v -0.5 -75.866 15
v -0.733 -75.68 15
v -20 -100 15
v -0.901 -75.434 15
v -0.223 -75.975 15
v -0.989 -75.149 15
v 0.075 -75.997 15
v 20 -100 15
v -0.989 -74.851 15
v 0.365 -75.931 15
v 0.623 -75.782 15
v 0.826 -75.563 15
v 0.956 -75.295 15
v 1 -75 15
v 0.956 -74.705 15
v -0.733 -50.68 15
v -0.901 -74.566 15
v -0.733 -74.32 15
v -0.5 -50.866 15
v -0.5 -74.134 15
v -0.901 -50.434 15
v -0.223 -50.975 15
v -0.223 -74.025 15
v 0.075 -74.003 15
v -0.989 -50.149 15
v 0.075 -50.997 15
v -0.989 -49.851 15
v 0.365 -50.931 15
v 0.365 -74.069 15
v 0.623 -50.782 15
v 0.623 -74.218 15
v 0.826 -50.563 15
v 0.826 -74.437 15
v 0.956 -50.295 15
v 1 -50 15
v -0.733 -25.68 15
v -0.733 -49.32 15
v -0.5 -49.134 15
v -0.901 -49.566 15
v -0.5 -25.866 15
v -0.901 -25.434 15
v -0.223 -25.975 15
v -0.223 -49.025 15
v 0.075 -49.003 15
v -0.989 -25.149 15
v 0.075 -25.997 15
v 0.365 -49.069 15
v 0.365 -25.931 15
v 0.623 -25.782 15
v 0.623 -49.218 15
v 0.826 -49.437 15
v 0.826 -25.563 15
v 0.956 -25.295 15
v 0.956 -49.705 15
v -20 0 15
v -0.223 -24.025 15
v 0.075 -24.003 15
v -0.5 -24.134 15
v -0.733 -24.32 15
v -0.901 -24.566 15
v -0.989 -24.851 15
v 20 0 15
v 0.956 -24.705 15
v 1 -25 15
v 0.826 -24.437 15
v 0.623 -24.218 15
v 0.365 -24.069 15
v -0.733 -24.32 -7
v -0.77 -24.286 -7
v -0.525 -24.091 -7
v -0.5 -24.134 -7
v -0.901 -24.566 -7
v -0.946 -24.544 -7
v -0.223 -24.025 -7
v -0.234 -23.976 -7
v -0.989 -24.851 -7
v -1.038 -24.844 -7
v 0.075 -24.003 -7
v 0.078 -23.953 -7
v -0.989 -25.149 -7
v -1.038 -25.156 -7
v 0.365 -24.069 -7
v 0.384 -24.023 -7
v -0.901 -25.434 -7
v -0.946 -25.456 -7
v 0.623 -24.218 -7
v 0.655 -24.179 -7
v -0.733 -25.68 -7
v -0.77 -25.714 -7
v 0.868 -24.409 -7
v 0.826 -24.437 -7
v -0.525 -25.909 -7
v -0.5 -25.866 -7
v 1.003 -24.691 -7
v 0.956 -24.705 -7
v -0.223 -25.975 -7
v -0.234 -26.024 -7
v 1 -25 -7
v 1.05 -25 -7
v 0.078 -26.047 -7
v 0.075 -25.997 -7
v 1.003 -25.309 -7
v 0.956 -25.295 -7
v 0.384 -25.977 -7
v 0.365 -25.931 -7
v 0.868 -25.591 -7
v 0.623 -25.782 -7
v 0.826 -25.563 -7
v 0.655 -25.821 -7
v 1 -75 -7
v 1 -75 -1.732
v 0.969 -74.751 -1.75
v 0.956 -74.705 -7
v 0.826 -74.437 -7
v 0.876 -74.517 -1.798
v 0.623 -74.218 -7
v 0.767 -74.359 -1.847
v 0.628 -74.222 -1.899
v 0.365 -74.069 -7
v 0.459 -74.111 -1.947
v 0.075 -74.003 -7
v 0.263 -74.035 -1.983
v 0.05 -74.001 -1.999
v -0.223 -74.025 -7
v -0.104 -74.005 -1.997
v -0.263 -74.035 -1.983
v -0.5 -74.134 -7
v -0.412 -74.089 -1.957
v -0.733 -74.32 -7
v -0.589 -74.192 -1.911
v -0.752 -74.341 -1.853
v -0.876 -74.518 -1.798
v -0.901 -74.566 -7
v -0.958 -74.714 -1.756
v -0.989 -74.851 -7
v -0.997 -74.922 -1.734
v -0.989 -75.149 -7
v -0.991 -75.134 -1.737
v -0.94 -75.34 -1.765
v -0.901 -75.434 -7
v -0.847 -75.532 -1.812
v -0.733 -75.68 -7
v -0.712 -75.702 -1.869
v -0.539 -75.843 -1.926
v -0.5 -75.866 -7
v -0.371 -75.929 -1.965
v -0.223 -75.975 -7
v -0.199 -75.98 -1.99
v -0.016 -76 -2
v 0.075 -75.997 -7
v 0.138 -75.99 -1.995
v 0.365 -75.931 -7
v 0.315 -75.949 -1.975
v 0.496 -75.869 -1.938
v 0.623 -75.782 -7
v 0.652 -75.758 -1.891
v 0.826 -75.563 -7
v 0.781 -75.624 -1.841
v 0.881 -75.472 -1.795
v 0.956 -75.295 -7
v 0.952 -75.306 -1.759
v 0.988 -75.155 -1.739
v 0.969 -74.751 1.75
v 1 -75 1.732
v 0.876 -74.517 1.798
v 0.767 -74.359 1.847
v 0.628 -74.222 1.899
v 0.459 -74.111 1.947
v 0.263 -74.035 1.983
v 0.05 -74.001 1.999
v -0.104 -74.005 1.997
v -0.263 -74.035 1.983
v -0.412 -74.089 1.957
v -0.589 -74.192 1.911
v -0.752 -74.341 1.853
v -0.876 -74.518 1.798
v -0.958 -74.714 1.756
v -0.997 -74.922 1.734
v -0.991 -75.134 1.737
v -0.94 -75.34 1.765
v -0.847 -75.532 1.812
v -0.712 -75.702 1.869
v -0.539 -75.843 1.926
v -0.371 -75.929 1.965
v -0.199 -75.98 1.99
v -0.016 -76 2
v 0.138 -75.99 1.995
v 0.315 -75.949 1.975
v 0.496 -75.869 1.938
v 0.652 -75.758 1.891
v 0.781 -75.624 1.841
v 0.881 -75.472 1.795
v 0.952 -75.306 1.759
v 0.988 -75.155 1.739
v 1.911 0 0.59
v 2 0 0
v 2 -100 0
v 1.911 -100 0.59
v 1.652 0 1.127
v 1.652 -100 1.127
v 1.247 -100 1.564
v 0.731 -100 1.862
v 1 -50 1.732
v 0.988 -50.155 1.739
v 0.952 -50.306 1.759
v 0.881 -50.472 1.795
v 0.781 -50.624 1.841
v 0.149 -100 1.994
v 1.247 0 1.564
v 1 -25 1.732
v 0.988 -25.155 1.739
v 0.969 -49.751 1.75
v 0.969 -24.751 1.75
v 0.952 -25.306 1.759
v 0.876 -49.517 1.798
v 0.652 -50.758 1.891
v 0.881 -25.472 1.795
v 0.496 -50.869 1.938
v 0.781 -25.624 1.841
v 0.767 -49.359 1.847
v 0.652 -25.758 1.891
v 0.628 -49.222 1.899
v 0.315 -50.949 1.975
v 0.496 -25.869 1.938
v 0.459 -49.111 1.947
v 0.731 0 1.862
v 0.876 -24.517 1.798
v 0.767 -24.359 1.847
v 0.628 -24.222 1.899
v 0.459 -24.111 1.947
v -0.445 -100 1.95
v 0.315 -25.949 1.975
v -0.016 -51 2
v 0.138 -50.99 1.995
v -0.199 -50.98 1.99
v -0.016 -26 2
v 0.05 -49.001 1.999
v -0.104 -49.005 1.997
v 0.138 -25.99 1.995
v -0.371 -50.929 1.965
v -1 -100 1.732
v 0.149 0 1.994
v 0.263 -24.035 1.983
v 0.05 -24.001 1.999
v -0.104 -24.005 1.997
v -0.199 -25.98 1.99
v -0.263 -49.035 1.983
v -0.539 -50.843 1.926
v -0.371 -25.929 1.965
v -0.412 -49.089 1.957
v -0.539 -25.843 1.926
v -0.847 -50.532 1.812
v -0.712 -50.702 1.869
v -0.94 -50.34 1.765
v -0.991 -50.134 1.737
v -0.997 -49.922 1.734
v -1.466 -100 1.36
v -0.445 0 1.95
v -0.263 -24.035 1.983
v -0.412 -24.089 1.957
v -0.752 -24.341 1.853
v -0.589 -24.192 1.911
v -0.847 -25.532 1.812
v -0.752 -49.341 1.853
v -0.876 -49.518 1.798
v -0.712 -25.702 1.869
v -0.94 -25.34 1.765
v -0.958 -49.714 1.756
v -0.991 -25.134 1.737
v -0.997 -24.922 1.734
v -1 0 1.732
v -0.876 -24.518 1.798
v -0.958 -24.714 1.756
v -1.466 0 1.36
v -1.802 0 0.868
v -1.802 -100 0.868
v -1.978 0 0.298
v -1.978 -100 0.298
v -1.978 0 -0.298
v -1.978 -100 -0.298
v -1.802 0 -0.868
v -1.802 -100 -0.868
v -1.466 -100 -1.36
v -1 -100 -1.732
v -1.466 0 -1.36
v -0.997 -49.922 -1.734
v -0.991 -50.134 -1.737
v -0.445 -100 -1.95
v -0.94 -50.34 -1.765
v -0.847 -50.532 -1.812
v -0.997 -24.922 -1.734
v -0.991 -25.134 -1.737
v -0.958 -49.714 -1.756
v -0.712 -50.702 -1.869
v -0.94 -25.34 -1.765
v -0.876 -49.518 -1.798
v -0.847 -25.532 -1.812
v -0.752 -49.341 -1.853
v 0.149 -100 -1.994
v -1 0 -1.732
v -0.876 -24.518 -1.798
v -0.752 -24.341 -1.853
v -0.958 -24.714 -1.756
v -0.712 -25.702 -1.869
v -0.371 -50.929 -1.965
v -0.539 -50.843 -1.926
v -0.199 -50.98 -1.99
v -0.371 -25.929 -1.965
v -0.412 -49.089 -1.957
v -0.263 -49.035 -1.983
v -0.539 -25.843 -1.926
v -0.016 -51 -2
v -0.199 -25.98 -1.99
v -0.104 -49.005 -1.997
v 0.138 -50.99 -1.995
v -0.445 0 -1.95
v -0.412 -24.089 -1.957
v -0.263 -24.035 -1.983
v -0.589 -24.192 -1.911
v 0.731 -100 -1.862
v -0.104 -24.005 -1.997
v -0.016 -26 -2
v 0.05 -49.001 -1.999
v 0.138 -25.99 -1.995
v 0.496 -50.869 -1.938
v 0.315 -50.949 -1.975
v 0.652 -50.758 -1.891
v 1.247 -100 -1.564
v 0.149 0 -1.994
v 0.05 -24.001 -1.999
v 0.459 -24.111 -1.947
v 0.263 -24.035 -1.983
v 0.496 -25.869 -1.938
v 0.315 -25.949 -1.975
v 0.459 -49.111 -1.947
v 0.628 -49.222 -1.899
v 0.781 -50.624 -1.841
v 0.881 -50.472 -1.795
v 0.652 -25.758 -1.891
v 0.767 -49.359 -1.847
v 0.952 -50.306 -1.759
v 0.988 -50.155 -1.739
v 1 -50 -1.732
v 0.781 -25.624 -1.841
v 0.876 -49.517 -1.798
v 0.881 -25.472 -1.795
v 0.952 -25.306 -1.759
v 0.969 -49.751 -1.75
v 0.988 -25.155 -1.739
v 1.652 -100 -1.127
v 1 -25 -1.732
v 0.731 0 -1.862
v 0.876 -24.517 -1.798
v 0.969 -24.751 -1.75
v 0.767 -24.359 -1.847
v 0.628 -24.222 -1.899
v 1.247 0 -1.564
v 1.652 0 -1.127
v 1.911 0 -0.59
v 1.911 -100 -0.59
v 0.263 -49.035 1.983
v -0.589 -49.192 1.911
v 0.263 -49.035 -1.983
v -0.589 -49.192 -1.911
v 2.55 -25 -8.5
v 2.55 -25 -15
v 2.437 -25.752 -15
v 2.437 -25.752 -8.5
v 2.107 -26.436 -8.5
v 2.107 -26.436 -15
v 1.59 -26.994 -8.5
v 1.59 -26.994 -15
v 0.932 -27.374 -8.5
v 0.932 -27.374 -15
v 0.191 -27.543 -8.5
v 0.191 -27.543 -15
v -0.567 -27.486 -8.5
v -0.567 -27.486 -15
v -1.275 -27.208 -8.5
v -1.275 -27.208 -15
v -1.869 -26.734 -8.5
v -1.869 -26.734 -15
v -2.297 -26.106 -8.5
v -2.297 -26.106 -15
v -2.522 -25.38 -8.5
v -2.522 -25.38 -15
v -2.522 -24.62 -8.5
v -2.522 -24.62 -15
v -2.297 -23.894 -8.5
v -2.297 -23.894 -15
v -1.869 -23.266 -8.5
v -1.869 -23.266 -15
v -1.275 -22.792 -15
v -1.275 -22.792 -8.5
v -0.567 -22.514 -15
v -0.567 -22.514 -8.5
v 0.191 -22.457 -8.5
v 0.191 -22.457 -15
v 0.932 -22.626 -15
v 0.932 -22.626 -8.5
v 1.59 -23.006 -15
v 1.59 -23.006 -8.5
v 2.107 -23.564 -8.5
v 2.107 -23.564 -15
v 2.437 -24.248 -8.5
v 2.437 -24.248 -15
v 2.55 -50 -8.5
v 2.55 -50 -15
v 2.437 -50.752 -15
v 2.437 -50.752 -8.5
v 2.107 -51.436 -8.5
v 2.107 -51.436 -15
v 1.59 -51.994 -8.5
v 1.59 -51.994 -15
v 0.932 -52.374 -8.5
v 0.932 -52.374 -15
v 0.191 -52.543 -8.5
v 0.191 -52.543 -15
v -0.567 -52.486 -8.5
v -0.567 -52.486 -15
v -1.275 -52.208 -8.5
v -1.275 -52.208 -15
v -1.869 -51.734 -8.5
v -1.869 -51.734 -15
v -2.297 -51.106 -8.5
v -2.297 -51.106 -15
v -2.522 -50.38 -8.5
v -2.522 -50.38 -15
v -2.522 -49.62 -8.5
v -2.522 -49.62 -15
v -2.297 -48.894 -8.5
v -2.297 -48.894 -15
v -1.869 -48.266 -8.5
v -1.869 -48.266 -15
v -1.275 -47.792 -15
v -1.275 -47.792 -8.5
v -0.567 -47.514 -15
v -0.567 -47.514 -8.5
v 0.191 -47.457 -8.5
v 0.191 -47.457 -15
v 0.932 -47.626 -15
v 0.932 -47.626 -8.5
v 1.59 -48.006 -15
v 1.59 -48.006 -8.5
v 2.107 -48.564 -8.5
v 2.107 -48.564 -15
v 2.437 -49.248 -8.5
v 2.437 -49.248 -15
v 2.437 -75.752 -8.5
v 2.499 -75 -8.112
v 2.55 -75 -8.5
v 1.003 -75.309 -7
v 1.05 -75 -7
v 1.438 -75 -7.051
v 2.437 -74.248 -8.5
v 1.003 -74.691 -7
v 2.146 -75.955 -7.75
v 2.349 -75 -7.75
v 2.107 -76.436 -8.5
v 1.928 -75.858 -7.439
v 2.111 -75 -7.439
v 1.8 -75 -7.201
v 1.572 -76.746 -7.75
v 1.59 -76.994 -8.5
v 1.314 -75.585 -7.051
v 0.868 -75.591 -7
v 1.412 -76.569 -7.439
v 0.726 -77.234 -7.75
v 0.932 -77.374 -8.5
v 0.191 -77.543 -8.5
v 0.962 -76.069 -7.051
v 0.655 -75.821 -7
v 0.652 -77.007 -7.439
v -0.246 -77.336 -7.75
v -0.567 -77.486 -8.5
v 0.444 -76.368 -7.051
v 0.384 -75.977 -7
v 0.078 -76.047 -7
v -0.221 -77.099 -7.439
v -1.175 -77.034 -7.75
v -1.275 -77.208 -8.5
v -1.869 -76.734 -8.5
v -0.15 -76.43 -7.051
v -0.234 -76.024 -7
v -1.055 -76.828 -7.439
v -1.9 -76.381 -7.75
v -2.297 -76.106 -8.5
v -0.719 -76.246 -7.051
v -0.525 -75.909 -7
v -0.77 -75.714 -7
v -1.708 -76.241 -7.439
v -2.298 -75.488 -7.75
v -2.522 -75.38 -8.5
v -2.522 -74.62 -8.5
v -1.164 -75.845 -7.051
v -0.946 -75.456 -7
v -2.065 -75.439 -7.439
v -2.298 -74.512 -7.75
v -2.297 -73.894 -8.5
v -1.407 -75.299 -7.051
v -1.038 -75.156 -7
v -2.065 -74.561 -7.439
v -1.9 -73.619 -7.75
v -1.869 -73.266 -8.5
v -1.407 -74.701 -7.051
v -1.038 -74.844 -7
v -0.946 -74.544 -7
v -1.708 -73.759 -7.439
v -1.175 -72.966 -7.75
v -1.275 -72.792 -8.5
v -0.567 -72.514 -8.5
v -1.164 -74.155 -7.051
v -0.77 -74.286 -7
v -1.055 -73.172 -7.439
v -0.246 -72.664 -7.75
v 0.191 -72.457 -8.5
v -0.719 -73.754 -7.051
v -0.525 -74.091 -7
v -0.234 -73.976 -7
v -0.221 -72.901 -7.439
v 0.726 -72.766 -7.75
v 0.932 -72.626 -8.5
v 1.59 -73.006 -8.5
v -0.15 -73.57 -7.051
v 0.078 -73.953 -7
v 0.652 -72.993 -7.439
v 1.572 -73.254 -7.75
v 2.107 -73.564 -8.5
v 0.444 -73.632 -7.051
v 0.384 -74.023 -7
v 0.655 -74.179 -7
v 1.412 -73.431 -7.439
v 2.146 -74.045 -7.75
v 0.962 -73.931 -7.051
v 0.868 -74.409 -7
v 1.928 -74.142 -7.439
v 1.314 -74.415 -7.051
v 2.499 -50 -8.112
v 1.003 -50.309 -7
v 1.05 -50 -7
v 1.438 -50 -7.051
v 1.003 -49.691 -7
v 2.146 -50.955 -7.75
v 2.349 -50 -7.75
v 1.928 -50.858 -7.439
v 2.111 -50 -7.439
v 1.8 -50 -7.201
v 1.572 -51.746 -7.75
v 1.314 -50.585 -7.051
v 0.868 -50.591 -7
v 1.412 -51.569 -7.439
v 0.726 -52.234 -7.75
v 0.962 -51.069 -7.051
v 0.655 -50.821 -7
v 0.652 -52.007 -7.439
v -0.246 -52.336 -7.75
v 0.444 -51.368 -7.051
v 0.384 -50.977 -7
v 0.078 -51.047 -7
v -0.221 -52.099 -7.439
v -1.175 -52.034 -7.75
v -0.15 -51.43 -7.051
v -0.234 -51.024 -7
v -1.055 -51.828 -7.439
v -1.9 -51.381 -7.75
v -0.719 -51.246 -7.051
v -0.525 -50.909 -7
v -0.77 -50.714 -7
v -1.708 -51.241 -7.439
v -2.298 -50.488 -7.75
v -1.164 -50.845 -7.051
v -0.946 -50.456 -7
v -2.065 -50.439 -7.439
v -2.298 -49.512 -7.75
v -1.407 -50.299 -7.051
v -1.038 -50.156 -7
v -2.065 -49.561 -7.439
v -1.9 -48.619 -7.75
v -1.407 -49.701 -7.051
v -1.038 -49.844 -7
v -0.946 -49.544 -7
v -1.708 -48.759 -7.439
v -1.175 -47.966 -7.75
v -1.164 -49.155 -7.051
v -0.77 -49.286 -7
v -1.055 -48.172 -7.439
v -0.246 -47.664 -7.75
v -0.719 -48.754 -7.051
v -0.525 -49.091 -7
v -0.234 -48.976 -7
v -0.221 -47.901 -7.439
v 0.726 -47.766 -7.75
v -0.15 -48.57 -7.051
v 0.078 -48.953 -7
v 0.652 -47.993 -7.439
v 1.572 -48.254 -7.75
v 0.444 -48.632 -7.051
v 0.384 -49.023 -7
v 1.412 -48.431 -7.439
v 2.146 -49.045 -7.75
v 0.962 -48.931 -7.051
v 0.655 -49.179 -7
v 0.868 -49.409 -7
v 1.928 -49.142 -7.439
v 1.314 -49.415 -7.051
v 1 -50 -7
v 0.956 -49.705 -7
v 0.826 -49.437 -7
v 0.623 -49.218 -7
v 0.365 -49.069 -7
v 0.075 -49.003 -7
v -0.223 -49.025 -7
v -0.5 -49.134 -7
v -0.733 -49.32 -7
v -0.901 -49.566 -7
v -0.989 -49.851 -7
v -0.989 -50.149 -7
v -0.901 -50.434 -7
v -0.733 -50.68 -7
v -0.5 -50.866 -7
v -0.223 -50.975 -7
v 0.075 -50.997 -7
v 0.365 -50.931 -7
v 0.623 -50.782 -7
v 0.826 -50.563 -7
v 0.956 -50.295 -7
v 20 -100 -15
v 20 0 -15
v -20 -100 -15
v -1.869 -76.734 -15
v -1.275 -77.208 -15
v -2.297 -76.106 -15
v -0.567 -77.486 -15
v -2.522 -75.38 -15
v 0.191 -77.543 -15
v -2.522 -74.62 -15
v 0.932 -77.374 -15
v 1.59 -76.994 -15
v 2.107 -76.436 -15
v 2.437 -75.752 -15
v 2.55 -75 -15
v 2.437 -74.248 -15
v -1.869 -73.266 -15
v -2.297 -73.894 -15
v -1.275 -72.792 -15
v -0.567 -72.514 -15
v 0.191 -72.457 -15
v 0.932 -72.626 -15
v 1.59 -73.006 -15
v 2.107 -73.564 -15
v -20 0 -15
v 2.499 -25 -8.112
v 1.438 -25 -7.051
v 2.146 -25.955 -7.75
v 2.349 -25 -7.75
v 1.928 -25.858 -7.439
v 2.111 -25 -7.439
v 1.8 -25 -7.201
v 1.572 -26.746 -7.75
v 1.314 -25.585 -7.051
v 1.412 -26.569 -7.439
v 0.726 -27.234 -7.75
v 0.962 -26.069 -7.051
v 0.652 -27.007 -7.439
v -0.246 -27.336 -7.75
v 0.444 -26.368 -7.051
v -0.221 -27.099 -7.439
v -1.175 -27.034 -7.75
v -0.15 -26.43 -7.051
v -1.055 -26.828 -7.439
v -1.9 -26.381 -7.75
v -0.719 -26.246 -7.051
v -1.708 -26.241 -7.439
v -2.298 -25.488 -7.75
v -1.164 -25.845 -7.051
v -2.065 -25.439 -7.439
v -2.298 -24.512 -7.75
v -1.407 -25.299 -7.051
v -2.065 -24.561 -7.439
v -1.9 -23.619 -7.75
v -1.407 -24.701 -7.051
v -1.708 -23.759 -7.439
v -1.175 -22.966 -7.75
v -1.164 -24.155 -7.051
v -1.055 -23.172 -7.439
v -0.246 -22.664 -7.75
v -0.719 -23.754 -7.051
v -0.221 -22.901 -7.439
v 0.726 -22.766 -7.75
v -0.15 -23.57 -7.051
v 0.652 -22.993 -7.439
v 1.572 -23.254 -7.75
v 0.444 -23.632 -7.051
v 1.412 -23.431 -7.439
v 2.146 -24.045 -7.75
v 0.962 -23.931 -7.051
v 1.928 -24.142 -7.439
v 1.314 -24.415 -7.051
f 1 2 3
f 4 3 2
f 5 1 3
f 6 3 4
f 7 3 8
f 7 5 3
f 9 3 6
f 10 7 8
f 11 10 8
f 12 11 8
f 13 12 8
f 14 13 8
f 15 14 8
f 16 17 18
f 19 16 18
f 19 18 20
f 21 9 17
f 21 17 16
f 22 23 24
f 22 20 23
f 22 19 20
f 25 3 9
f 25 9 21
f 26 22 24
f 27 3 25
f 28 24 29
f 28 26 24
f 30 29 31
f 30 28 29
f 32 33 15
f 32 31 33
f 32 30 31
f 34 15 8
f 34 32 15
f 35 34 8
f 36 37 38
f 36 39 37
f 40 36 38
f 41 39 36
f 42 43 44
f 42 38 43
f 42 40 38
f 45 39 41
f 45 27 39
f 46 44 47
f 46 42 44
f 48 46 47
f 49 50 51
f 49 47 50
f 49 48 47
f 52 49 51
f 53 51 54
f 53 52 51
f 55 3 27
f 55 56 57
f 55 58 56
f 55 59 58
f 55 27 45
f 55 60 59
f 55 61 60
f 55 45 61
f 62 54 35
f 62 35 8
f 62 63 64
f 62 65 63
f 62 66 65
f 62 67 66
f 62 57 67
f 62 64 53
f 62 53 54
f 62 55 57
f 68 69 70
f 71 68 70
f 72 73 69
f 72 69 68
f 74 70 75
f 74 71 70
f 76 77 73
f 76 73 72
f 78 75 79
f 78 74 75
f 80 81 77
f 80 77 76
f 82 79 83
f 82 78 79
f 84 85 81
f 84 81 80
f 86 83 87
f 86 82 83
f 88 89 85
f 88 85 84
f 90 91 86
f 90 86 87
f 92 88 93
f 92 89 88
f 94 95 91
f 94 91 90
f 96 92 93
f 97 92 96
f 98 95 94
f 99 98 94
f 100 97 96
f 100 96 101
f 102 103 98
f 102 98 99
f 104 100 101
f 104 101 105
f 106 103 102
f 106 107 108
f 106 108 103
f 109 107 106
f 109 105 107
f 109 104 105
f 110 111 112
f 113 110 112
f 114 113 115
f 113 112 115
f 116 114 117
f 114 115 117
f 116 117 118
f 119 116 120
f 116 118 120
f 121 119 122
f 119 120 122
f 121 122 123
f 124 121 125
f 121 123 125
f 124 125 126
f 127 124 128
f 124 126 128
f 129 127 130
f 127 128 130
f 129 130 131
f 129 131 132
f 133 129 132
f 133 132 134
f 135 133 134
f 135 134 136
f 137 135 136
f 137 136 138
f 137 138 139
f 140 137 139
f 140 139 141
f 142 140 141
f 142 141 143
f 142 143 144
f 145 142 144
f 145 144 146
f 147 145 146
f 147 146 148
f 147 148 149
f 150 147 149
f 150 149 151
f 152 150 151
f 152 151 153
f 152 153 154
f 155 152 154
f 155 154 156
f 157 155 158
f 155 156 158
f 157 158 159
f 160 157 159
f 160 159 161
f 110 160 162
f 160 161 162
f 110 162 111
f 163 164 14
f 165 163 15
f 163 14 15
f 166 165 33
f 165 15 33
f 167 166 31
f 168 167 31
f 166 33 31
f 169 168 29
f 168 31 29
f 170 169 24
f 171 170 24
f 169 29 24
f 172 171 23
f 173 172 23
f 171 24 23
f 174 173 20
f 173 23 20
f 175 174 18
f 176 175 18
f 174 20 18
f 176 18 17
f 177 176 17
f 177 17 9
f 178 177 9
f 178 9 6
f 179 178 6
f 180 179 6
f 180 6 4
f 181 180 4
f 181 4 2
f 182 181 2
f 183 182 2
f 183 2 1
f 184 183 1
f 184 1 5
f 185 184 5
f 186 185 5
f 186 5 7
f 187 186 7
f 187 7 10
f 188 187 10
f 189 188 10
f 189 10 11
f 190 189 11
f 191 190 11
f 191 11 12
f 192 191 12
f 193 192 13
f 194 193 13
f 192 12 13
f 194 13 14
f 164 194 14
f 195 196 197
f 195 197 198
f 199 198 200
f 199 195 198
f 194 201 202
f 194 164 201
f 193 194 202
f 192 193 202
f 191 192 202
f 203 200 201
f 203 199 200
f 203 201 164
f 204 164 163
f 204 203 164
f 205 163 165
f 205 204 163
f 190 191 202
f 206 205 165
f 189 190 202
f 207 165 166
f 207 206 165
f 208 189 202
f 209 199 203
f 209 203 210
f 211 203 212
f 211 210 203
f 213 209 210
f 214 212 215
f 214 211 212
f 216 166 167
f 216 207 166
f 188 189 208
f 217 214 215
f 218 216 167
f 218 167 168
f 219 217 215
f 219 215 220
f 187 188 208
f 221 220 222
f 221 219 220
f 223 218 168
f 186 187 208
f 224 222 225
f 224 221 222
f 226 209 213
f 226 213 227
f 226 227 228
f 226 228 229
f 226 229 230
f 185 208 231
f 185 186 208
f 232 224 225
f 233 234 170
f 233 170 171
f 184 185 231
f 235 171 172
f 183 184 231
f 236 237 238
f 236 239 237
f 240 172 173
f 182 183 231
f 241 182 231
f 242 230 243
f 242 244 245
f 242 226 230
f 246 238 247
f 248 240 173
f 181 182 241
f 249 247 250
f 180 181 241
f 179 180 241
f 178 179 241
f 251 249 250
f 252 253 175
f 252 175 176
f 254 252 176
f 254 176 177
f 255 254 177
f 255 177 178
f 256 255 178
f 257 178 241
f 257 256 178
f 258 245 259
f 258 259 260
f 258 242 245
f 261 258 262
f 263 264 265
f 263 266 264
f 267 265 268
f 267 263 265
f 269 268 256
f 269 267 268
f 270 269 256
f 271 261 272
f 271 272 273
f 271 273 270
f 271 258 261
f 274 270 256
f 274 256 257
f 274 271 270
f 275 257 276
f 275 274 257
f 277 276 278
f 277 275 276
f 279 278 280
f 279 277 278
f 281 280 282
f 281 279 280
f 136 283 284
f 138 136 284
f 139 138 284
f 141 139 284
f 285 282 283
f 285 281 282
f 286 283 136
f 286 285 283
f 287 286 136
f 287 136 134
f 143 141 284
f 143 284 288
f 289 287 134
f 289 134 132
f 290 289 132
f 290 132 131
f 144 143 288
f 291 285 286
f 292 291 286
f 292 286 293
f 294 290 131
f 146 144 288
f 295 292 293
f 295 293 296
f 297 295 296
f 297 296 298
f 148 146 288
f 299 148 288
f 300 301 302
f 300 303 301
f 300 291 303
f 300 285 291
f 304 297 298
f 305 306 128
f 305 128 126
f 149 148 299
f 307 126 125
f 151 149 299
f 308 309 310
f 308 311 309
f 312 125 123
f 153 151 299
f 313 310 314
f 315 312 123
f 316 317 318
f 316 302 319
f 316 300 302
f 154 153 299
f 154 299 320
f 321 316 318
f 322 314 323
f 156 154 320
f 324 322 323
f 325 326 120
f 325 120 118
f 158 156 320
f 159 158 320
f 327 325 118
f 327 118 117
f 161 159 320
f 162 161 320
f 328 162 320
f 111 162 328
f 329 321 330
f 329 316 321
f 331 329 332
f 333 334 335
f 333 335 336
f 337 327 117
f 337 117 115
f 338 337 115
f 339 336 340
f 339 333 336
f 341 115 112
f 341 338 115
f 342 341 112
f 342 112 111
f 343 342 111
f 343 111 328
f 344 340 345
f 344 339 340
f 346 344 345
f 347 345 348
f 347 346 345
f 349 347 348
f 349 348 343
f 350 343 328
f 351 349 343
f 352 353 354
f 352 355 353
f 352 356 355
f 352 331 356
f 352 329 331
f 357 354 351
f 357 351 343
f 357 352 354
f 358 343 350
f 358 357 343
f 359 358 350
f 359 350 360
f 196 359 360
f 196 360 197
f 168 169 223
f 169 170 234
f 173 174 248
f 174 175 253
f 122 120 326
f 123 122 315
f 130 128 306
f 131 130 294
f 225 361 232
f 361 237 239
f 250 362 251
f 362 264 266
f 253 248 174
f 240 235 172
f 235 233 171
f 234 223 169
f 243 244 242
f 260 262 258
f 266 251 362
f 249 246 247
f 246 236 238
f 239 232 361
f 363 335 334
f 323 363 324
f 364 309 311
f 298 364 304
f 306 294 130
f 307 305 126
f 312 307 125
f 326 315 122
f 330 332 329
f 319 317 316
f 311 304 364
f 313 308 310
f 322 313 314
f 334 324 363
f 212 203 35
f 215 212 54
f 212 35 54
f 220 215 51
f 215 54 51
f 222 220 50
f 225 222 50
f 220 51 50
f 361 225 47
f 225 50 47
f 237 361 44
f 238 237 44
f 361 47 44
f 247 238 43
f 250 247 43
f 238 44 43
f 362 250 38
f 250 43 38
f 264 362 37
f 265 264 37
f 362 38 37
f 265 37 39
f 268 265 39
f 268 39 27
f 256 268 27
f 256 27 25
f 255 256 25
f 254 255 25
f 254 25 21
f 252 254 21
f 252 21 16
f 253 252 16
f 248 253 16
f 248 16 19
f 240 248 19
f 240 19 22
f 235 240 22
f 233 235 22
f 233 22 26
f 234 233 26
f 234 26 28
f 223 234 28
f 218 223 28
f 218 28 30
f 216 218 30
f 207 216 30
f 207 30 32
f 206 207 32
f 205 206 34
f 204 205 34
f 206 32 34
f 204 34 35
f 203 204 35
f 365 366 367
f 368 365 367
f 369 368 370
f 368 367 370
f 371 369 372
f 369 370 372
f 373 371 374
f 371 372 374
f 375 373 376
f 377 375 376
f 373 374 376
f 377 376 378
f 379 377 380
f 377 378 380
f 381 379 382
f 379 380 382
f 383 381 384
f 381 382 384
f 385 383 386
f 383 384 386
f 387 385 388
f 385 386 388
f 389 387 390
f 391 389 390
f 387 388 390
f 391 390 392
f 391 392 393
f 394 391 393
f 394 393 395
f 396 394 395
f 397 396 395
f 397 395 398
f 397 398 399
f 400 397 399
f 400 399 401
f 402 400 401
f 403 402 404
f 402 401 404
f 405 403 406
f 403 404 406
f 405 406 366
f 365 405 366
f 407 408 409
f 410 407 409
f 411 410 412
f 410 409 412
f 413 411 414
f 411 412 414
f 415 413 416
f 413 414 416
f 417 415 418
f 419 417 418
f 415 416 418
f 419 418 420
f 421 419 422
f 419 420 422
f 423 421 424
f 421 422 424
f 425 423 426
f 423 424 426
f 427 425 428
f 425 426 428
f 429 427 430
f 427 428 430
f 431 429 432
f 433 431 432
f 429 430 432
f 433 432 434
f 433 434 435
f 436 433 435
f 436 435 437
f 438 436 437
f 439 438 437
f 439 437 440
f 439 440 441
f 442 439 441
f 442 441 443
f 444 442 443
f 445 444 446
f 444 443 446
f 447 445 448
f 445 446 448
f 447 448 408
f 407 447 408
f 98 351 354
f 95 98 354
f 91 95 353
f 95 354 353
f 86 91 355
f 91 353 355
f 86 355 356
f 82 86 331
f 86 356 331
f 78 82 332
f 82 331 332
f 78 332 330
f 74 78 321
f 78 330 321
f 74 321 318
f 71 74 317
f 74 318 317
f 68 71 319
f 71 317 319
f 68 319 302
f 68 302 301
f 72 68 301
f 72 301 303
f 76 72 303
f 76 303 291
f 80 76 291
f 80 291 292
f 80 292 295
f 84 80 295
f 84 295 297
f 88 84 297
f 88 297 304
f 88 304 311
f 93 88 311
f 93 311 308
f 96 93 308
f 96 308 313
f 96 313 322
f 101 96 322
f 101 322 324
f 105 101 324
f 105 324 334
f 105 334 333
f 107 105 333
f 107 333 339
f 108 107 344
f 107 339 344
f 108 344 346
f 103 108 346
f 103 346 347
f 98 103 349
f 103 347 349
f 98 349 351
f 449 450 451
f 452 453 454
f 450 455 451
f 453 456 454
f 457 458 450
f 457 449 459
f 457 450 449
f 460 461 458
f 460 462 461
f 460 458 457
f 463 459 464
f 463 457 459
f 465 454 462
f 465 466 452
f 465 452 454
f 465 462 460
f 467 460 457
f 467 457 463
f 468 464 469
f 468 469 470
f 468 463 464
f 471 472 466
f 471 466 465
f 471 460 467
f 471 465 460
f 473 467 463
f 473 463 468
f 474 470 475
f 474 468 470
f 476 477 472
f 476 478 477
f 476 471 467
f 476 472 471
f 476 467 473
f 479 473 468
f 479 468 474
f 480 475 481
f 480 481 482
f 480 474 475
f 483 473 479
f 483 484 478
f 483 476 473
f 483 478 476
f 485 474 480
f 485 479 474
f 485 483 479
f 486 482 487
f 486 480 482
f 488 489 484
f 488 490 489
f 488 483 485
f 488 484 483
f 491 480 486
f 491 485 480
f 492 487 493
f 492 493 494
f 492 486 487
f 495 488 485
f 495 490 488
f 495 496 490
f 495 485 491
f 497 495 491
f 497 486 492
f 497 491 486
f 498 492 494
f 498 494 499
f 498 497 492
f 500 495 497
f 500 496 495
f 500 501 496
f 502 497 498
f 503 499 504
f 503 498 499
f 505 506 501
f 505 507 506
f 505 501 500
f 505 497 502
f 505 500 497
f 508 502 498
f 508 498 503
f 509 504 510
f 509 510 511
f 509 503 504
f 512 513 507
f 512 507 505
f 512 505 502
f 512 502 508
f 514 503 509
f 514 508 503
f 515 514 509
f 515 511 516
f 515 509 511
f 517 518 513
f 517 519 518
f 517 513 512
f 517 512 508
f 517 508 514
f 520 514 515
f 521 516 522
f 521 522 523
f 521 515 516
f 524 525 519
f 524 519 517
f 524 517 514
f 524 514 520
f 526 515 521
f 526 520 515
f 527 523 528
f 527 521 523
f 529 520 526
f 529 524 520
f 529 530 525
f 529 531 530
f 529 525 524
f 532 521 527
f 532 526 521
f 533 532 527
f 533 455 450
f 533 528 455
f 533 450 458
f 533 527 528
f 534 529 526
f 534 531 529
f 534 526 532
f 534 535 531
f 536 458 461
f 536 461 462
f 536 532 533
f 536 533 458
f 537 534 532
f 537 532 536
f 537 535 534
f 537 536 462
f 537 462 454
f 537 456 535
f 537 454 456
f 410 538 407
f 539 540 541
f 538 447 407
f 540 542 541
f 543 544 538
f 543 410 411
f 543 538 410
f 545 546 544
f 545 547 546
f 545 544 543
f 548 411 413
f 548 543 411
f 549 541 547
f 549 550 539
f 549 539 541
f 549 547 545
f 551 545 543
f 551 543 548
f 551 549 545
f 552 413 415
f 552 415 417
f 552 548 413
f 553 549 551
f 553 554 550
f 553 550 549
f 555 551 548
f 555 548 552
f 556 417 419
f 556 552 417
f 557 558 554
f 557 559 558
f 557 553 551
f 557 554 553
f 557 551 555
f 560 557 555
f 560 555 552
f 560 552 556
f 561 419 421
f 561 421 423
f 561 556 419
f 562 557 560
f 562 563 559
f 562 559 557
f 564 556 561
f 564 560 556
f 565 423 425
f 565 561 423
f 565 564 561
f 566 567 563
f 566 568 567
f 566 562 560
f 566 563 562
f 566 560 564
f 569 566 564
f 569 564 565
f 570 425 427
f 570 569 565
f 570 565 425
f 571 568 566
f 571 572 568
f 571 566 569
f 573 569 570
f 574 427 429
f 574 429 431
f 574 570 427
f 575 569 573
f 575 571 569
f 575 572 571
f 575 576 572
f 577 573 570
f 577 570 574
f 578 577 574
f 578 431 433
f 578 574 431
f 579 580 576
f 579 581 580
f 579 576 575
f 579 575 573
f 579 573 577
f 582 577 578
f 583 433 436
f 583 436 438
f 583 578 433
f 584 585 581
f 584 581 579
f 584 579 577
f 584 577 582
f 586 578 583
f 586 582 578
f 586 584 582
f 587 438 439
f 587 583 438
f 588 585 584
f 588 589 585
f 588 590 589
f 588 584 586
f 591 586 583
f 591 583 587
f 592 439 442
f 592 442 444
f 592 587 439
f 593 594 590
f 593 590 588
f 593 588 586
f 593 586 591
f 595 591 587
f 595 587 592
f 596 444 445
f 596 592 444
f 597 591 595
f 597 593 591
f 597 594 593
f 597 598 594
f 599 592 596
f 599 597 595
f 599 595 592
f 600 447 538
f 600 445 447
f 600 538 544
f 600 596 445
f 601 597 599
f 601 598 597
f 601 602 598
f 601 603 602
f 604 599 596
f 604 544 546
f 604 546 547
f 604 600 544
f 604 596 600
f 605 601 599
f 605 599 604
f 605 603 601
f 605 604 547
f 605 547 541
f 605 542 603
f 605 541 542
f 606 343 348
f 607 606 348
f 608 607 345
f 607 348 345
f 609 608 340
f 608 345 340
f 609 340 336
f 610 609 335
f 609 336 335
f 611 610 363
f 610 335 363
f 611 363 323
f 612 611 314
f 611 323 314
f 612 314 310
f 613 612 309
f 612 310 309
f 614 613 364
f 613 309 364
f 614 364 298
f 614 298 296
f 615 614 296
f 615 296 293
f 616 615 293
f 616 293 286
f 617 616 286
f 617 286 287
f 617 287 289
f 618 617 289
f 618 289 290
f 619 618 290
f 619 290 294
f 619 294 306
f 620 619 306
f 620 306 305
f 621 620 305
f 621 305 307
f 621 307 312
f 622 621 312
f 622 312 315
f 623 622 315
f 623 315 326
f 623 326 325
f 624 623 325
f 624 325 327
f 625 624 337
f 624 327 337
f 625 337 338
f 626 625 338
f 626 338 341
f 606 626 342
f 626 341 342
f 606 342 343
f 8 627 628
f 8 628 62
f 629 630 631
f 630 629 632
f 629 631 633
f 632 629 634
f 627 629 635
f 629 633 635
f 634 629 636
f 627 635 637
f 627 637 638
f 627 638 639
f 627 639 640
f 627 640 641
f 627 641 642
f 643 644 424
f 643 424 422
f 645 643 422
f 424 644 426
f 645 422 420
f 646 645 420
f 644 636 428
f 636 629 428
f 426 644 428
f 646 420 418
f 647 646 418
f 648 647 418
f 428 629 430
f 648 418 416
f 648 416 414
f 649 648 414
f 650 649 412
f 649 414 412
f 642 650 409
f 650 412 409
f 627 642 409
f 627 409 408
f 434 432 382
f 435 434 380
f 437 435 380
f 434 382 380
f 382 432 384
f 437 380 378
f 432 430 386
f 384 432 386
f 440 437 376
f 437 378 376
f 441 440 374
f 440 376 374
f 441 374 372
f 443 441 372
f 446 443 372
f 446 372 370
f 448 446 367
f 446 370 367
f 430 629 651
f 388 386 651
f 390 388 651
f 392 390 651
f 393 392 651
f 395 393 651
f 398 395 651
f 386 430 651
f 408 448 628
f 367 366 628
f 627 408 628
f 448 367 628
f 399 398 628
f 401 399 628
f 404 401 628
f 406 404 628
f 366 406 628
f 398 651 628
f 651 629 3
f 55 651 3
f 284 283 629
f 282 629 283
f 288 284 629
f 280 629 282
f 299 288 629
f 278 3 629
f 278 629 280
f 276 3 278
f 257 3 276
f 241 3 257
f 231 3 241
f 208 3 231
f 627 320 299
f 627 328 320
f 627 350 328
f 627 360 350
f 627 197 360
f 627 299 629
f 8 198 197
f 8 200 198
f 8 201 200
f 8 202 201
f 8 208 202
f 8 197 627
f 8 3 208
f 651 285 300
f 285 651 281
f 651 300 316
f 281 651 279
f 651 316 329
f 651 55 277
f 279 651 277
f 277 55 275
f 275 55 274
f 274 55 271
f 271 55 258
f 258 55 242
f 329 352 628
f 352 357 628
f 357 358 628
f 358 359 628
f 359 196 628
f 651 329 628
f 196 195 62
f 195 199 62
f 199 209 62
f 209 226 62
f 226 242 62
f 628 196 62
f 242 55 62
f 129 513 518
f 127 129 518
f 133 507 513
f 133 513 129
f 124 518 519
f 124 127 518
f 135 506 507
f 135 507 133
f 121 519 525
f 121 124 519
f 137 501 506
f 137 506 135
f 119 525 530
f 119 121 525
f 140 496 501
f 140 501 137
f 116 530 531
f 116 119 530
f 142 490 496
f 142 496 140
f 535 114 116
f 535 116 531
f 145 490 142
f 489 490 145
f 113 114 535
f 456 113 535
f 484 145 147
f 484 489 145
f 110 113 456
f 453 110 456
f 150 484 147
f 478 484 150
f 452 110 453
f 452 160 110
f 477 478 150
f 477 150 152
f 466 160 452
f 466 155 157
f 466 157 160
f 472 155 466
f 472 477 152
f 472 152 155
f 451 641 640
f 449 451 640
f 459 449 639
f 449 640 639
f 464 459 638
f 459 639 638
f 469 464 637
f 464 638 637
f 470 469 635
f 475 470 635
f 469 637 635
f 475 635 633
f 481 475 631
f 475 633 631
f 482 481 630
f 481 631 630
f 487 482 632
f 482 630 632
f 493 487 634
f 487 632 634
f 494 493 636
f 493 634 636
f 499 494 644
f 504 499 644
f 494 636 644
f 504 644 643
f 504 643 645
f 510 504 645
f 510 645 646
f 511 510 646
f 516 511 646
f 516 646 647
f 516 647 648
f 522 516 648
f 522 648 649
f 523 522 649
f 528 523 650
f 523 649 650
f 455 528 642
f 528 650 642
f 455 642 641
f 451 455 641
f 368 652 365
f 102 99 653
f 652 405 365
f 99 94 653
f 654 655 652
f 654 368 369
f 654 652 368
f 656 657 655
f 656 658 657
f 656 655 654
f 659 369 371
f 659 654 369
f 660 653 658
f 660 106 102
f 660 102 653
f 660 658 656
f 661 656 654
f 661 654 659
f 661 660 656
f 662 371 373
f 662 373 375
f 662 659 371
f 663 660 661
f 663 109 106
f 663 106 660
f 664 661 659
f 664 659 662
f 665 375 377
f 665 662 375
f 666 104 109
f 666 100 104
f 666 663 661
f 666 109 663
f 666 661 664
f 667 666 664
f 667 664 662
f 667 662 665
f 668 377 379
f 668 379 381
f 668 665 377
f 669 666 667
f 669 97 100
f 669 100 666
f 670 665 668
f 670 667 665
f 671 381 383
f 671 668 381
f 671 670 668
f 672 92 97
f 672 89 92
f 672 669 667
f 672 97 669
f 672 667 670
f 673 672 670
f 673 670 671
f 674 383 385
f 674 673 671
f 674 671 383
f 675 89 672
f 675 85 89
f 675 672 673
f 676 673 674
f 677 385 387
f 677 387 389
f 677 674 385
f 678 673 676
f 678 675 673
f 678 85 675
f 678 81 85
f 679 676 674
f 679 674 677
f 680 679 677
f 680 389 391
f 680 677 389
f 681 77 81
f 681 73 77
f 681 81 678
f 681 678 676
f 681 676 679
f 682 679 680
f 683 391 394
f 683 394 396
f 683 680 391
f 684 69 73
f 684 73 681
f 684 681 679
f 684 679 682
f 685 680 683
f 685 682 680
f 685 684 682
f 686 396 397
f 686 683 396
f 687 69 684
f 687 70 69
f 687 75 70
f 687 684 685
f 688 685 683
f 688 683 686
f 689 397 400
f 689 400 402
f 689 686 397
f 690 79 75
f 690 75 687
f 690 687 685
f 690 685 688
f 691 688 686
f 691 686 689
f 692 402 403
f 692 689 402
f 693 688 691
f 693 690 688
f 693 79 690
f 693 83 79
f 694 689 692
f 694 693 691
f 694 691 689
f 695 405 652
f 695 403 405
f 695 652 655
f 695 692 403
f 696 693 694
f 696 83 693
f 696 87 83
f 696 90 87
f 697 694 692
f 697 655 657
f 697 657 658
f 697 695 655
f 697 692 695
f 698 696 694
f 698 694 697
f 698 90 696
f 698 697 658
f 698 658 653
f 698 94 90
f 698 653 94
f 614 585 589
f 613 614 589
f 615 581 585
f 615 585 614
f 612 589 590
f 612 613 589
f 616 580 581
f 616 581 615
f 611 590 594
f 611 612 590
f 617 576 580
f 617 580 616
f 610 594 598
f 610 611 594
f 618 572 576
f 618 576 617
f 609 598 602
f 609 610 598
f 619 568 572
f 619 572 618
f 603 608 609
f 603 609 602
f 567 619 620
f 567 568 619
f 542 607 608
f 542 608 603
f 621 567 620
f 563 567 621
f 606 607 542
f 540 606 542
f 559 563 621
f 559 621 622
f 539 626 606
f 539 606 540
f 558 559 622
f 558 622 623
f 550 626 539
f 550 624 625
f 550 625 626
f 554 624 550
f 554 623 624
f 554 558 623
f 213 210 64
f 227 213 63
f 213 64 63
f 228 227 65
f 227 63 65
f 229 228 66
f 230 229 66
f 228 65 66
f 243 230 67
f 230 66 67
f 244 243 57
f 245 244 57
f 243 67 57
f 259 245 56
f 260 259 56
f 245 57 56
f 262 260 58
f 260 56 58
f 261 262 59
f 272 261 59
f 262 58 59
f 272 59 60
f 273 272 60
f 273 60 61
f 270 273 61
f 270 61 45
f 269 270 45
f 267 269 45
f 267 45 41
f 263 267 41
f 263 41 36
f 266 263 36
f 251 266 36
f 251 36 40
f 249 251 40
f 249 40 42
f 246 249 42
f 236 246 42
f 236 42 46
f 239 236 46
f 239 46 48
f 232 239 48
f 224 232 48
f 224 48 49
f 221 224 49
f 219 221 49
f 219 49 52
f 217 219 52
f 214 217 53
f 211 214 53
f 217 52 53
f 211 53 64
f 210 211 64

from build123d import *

# Parameters (mm, degrees)
F0_W     = 40
F0_H     = 30
F0_R     = 2
F1_DEPTH = 100
F2_R     = 1
F3_DEPTH = 30
F4_R     = 2.55
F5_DEPTH = 8
F6_R     = 1.5
F7_R     = 1.5
F8_R     = 1.5


with BuildPart() as f1:
    # F0 (on Front) → F1 (new body)
    with BuildSketch(Plane.XZ):
        Rectangle(F0_W, F0_H)
        Circle(F0_R, mode=Mode.SUBTRACT)
    extrude(amount=F1_DEPTH)

    # F2 (on face) → F3 (cut)
    with BuildSketch(Plane.XY.offset(15)):
        with Locations((0, -25)):
            Circle(F2_R)
        with Locations((0, -50)):
            Circle(F2_R)
        with Locations((0, -75)):
            Circle(F2_R)
    extrude(amount=-F3_DEPTH, mode=Mode.SUBTRACT)

    # F4 (on face) → F5 (cut)
    with BuildSketch(Plane(origin=(0, 0, -15), x_dir=(1, 0, 0), z_dir=(0, 0, -1))):
        with Locations((0, 25)):
            Circle(F4_R)
        with Locations((0, 50)):
            Circle(F4_R)
        with Locations((0, 75)):
            Circle(F4_R)
    extrude(amount=-F5_DEPTH, mode=Mode.SUBTRACT)

    # F6
    f6_edges = [f1.edges().sort_by_distance(p)[0] for p in [
        (-2.55, -25, -7),
    ]]
    fillet(f6_edges, radius=F6_R)

    # F7
    f7_edges = [f1.edges().sort_by_distance(p)[0] for p in [
        (-2.55, -50, -7),
    ]]
    fillet(f7_edges, radius=F7_R)

    # F8
    f8_edges = [f1.edges().sort_by_distance(p)[0] for p in [
        (-2.55, -75, -7),
    ]]
    fillet(f8_edges, radius=F8_R)


solid = f1.part
